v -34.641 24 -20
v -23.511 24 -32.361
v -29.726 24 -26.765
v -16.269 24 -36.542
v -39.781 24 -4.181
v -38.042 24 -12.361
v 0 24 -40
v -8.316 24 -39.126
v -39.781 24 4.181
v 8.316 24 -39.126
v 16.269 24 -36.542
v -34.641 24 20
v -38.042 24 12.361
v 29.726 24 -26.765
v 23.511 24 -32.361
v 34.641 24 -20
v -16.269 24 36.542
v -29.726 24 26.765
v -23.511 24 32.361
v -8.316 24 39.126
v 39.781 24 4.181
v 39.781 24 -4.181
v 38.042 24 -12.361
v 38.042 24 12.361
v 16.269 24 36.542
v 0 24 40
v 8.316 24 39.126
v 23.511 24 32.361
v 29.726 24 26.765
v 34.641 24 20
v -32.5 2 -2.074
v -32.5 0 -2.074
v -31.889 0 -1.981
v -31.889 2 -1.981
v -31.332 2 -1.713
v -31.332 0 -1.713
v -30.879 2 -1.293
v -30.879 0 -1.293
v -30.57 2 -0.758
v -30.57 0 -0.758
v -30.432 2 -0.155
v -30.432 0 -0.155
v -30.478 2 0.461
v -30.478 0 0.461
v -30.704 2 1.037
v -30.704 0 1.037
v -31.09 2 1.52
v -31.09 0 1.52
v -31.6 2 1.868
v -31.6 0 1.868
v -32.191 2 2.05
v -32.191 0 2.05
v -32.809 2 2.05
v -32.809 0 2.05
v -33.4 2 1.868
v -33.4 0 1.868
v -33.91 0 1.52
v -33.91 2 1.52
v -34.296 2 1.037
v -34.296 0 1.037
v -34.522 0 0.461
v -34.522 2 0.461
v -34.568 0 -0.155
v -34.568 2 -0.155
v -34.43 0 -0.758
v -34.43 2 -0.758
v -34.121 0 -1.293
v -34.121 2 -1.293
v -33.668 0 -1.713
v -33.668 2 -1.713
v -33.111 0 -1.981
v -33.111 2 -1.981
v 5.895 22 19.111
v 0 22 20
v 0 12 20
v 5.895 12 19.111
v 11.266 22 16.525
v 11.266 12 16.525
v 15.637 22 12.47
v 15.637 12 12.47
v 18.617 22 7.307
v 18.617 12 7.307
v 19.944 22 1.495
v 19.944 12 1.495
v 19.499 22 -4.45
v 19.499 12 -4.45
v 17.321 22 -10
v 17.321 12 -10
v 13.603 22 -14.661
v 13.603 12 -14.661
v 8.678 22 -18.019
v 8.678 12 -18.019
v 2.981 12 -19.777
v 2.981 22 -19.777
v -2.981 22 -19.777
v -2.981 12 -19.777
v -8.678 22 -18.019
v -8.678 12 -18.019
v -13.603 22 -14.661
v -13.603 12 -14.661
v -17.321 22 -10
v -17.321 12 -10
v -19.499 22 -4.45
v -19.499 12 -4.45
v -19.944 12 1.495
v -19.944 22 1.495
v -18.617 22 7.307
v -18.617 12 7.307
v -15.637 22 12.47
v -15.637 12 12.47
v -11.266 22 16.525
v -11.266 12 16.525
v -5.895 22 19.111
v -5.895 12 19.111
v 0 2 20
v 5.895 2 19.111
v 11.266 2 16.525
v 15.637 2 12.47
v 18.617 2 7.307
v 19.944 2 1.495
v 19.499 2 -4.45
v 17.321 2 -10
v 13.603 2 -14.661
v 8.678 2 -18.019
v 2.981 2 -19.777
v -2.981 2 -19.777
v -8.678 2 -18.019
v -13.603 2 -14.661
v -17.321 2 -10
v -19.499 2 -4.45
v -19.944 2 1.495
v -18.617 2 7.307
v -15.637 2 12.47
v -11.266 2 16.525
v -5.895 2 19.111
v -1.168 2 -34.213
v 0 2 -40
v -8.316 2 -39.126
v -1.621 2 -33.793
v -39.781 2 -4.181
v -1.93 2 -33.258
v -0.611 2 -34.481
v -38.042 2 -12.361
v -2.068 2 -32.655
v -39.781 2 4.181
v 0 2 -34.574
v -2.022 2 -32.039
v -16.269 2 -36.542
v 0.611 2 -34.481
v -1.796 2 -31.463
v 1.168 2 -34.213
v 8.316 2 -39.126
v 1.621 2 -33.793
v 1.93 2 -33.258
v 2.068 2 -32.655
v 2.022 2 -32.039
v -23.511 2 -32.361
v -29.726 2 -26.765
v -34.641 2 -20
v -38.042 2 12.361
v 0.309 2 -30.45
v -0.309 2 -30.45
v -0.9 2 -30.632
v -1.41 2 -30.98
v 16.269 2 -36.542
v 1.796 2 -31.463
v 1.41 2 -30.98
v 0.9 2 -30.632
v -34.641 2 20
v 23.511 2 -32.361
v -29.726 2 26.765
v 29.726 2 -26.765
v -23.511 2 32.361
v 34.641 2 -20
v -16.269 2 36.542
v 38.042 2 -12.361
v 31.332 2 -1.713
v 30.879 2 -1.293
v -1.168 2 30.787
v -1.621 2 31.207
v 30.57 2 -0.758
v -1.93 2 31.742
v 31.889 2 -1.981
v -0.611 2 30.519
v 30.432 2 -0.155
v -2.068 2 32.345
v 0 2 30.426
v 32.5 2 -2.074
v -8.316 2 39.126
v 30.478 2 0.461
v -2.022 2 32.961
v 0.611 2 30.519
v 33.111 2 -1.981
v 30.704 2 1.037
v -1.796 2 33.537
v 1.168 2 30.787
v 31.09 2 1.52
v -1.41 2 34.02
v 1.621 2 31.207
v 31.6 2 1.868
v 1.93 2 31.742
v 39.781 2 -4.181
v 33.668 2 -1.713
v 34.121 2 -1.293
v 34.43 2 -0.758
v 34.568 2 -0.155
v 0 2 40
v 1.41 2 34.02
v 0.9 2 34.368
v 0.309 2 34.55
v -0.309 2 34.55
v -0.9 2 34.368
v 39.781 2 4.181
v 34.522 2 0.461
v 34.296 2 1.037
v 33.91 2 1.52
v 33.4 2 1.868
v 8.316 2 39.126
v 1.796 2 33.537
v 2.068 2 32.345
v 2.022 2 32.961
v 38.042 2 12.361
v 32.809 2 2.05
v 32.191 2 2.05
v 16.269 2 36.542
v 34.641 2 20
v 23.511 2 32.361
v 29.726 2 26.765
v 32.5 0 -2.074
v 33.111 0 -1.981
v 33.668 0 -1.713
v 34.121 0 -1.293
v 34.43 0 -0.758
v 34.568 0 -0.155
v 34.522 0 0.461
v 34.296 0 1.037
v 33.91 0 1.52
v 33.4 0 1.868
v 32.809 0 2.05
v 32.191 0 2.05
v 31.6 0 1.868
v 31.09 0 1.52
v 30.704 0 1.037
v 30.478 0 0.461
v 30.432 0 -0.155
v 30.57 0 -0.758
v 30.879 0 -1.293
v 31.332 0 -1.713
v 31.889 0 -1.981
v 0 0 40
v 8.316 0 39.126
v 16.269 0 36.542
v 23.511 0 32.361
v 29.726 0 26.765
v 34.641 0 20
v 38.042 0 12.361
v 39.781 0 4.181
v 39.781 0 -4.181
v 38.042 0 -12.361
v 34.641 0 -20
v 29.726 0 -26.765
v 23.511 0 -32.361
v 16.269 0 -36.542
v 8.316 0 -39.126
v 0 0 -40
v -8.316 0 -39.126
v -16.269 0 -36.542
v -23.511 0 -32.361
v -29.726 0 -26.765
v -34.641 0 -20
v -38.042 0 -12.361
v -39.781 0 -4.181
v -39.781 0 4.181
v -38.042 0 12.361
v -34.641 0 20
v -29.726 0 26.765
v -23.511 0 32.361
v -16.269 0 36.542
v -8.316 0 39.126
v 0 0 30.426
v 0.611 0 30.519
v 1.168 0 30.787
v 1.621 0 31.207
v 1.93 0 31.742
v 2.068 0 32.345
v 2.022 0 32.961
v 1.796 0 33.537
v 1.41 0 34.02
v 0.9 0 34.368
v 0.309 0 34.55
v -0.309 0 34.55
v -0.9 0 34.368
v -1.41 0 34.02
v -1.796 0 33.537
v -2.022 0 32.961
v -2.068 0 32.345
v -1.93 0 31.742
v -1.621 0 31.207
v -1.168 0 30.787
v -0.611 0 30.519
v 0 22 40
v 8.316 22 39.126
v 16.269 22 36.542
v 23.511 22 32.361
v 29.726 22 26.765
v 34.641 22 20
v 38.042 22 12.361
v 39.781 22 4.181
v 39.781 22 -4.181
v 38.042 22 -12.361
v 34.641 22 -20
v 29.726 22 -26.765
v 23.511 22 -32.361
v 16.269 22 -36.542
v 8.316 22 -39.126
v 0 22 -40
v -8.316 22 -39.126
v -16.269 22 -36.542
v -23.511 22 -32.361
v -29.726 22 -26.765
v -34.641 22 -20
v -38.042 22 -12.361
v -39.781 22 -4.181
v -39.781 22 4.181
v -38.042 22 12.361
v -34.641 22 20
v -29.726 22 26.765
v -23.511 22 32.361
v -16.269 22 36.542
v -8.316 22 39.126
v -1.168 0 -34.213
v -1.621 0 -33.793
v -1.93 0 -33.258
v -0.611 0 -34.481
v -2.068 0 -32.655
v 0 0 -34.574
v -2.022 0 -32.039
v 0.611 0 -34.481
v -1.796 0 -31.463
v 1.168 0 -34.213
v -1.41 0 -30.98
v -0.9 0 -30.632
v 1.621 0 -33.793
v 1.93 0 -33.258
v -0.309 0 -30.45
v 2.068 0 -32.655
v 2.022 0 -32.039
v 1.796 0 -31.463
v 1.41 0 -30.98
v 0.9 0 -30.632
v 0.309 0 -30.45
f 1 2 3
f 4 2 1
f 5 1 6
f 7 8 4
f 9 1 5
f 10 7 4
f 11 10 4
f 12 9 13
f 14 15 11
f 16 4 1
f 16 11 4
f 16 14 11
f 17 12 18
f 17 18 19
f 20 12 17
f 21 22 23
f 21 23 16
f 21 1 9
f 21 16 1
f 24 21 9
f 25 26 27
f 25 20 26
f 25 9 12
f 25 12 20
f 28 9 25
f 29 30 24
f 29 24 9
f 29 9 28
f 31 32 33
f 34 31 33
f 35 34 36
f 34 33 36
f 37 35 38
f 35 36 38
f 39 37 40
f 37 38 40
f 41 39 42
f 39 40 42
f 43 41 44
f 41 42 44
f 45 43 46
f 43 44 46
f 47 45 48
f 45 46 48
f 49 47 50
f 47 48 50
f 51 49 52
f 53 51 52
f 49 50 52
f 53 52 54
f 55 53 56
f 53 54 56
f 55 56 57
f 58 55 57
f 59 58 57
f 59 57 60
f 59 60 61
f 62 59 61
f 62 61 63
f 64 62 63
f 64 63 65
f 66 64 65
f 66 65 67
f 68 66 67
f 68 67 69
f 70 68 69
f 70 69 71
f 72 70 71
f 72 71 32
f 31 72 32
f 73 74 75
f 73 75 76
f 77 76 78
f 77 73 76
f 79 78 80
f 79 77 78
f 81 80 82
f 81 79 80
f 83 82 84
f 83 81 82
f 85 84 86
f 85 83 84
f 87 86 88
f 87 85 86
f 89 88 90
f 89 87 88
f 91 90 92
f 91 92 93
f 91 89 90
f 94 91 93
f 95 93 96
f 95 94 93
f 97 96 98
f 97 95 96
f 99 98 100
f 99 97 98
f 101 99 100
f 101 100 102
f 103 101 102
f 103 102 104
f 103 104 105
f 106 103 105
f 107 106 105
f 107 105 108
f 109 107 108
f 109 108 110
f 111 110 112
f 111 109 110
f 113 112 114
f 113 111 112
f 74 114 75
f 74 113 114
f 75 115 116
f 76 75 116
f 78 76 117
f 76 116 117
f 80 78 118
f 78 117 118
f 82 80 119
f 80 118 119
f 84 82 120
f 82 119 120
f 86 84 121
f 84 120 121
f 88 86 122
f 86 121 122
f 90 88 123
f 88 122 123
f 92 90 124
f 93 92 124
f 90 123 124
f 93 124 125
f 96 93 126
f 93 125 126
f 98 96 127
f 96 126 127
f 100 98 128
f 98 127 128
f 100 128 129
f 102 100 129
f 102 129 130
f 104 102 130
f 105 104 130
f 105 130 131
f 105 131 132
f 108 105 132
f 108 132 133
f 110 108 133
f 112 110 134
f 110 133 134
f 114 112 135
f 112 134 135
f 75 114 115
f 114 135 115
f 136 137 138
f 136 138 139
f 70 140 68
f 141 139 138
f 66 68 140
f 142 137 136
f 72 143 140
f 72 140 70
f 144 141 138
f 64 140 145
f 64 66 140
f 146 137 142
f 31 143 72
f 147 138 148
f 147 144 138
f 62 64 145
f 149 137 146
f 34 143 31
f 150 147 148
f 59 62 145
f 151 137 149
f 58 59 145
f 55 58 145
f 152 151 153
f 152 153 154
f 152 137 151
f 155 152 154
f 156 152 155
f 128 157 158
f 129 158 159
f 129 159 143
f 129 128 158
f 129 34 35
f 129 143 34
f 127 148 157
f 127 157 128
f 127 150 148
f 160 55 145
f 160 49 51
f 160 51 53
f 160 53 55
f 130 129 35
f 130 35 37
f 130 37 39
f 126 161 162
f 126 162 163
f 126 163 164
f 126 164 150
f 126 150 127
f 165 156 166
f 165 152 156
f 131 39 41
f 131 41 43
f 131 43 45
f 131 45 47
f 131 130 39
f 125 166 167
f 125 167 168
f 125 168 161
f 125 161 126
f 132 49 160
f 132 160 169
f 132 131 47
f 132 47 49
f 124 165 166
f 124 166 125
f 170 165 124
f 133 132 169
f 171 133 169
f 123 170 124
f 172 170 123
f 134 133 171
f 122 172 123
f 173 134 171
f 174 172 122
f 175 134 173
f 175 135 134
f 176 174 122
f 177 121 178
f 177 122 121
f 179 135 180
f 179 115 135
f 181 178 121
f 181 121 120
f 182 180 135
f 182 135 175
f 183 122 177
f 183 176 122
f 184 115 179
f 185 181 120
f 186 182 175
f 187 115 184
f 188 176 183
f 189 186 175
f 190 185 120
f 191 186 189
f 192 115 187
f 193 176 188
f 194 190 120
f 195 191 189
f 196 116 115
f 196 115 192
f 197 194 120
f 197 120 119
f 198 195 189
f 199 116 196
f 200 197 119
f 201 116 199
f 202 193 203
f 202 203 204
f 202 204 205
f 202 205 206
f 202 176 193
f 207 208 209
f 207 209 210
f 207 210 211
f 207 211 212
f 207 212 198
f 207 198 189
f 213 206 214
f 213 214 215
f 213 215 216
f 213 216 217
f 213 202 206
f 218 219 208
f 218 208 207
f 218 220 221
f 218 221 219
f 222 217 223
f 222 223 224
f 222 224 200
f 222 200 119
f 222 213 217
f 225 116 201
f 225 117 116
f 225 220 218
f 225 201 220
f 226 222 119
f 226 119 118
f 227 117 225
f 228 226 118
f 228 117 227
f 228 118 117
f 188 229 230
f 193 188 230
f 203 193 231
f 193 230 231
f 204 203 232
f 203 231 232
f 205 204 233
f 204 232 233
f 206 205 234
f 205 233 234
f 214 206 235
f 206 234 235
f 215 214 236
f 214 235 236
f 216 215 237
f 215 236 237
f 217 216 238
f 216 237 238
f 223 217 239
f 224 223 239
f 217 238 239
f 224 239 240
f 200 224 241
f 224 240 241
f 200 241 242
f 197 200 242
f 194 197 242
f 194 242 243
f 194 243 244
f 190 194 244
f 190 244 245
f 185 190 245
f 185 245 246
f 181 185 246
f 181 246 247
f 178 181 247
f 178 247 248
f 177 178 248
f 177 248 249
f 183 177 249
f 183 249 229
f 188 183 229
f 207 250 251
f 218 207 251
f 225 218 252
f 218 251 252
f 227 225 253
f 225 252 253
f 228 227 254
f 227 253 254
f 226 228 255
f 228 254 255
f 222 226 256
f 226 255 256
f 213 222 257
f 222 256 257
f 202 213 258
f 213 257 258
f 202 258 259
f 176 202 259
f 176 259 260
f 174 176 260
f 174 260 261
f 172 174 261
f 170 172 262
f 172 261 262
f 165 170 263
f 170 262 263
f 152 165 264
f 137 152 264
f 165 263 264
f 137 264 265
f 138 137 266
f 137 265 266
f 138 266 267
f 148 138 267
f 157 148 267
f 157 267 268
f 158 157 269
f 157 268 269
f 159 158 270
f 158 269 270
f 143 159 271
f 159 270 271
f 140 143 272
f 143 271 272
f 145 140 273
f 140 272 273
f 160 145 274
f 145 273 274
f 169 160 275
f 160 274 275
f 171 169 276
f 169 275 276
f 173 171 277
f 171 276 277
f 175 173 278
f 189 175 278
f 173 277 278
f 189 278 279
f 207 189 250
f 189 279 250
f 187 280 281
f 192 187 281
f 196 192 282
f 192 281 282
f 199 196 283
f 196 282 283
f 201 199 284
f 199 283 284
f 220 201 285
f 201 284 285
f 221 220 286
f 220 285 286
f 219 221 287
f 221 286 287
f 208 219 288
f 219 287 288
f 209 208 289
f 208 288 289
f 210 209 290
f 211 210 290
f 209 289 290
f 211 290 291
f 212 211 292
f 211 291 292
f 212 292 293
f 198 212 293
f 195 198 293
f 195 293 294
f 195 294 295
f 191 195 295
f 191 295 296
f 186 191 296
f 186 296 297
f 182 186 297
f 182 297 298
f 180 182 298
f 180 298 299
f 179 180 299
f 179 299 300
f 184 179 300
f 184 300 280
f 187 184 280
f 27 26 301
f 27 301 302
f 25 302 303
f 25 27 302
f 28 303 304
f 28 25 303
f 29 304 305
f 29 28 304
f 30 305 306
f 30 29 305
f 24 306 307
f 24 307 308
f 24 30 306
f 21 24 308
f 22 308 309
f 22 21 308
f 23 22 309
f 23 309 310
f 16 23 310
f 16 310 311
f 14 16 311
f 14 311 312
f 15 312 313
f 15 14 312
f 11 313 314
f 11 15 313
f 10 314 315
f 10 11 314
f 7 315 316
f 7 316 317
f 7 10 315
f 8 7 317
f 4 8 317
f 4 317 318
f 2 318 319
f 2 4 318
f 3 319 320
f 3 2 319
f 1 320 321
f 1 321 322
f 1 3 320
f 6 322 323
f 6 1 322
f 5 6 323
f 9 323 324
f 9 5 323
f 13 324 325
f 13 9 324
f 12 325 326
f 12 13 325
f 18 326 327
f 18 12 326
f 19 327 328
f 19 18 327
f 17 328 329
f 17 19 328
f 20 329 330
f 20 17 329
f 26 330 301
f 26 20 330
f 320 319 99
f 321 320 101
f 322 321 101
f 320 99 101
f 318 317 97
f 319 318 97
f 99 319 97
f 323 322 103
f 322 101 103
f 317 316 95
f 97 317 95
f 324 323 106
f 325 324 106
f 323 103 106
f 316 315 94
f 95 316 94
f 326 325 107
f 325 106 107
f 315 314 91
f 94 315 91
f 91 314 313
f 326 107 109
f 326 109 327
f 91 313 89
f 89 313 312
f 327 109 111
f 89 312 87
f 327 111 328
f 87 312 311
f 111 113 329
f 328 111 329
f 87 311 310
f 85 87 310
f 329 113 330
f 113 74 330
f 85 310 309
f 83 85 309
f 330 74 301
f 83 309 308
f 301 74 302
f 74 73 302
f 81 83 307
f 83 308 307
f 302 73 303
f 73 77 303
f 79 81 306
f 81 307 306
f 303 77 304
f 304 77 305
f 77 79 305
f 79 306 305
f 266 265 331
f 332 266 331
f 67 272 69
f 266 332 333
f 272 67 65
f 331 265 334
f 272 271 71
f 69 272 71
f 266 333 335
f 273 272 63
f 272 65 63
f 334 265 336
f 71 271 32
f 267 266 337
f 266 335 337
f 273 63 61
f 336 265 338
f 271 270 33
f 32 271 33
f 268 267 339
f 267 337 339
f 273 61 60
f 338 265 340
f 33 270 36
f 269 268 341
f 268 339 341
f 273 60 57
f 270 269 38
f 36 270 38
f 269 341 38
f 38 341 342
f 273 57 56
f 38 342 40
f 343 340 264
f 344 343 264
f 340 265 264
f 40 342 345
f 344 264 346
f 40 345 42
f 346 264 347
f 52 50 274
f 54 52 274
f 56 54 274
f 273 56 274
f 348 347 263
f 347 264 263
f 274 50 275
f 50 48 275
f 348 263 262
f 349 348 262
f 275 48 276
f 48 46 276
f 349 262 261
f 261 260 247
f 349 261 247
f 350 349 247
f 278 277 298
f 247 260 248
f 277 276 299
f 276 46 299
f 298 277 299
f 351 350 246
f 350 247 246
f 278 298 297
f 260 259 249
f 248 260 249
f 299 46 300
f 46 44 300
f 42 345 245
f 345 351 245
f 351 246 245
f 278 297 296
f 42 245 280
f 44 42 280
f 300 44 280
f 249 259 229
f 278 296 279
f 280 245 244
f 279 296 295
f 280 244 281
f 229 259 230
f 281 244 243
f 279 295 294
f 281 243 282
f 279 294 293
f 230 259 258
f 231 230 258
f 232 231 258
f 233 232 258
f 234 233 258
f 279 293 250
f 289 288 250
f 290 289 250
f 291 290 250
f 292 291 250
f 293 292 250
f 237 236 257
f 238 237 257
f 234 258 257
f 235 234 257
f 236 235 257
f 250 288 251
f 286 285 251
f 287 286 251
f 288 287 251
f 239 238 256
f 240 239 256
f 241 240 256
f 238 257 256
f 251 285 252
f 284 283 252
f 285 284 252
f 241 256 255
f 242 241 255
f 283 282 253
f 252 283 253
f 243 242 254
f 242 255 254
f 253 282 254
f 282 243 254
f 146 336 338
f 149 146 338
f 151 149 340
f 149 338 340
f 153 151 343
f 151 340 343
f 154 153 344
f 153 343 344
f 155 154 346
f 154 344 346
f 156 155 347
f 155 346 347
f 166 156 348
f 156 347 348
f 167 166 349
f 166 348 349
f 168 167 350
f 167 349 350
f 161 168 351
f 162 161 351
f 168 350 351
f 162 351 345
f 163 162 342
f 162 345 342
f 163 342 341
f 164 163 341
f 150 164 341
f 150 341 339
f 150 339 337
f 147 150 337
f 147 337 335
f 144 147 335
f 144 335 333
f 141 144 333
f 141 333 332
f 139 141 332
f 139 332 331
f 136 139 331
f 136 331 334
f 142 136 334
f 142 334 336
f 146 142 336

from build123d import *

# Parameters (mm, degrees)
SKETCH1_R           = 40
BOSS_EXTRUDE1_DEPTH = 2
SKETCH2_R           = 20
BOSS_EXTRUDE2_DEPTH = 10
CUT_EXTRUDE1_REACH  = 63.449
SKETCH3_R           = 2.073577671


with BuildPart() as part:
    # Sketch1 → Boss-Extrude1 (new body)
    with BuildSketch(Plane(origin=(0, 0, 0), x_dir=(1, 0, 0), z_dir=(0, 1, 0))):
        with Locations(Location((0, 0, 0), (0, 0, 270))):
            Circle(SKETCH1_R)
    boss_extrude1 = extrude(amount=BOSS_EXTRUDE1_DEPTH)

    # Sketch2 → Boss-Extrude2 (add)
    with BuildSketch(Plane(origin=(0, 2, 0), x_dir=(1, 0, 0), z_dir=(0, 1, 0))):
        with Locations(Location((0, 0, 0), (0, 0, 270))):
            Circle(SKETCH2_R)
    boss_extrude2 = extrude(amount=BOSS_EXTRUDE2_DEPTH)

    # Mirror1: Boss-Extrude1, Boss-Extrude2 across plane
    add(boss_extrude1.mirror(Plane.ZX.offset(12)))
    add(boss_extrude2.mirror(Plane.ZX.offset(12)))

    # Sketch3 → Cut-Extrude1 (cut, up to next)
    with BuildSketch(Plane.XZ, mode=Mode.PRIVATE) as cut_extrude1_sk1:
        with Locations(Location((0, 32.5, 0), (0, 0, 270))):
            Circle(SKETCH3_R)
    cut_extrude1_tool1 = extrude(cut_extrude1_sk1.sketch, amount=-CUT_EXTRUDE1_REACH, mode=Mode.PRIVATE) & part.part
    # Sketch3 → Cut-Extrude1 (cut, up to next)
    with BuildSketch(Plane.XZ, mode=Mode.PRIVATE) as cut_extrude1_sk2:
        with Locations(Location((32.5, 0, 0), (0, 0, 270))):
            Circle(SKETCH3_R)
    cut_extrude1_tool2 = extrude(cut_extrude1_sk2.sketch, amount=-CUT_EXTRUDE1_REACH, mode=Mode.PRIVATE) & part.part
    # Sketch3 → Cut-Extrude1 (cut, up to next)
    with BuildSketch(Plane.XZ, mode=Mode.PRIVATE) as cut_extrude1_sk3:
        with Locations(Location((0, -32.5, 0), (0, 0, 270))):
            Circle(SKETCH3_R)
    cut_extrude1_tool3 = extrude(cut_extrude1_sk3.sketch, amount=-CUT_EXTRUDE1_REACH, mode=Mode.PRIVATE) & part.part
    # Sketch3 → Cut-Extrude1 (cut, up to next)
    with BuildSketch(Plane.XZ, mode=Mode.PRIVATE) as cut_extrude1_sk4:
        with Locations(Location((-32.5, 0, 0), (0, 0, 270))):
            Circle(SKETCH3_R)
    cut_extrude1_tool4 = extrude(cut_extrude1_sk4.sketch, amount=-CUT_EXTRUDE1_REACH, mode=Mode.PRIVATE) & part.part
    add(cut_extrude1_tool1.solids().sort_by_distance((0, 0, 32.5))[0], mode=Mode.SUBTRACT)
    add(cut_extrude1_tool2.solids().sort_by_distance((32.5, 0, 0))[0], mode=Mode.SUBTRACT)
    add(cut_extrude1_tool3.solids().sort_by_distance((0, 0, -32.5))[0], mode=Mode.SUBTRACT)
    add(cut_extrude1_tool4.solids().sort_by_distance((-32.5, 0, 0))[0], mode=Mode.SUBTRACT)


solid = part.part
